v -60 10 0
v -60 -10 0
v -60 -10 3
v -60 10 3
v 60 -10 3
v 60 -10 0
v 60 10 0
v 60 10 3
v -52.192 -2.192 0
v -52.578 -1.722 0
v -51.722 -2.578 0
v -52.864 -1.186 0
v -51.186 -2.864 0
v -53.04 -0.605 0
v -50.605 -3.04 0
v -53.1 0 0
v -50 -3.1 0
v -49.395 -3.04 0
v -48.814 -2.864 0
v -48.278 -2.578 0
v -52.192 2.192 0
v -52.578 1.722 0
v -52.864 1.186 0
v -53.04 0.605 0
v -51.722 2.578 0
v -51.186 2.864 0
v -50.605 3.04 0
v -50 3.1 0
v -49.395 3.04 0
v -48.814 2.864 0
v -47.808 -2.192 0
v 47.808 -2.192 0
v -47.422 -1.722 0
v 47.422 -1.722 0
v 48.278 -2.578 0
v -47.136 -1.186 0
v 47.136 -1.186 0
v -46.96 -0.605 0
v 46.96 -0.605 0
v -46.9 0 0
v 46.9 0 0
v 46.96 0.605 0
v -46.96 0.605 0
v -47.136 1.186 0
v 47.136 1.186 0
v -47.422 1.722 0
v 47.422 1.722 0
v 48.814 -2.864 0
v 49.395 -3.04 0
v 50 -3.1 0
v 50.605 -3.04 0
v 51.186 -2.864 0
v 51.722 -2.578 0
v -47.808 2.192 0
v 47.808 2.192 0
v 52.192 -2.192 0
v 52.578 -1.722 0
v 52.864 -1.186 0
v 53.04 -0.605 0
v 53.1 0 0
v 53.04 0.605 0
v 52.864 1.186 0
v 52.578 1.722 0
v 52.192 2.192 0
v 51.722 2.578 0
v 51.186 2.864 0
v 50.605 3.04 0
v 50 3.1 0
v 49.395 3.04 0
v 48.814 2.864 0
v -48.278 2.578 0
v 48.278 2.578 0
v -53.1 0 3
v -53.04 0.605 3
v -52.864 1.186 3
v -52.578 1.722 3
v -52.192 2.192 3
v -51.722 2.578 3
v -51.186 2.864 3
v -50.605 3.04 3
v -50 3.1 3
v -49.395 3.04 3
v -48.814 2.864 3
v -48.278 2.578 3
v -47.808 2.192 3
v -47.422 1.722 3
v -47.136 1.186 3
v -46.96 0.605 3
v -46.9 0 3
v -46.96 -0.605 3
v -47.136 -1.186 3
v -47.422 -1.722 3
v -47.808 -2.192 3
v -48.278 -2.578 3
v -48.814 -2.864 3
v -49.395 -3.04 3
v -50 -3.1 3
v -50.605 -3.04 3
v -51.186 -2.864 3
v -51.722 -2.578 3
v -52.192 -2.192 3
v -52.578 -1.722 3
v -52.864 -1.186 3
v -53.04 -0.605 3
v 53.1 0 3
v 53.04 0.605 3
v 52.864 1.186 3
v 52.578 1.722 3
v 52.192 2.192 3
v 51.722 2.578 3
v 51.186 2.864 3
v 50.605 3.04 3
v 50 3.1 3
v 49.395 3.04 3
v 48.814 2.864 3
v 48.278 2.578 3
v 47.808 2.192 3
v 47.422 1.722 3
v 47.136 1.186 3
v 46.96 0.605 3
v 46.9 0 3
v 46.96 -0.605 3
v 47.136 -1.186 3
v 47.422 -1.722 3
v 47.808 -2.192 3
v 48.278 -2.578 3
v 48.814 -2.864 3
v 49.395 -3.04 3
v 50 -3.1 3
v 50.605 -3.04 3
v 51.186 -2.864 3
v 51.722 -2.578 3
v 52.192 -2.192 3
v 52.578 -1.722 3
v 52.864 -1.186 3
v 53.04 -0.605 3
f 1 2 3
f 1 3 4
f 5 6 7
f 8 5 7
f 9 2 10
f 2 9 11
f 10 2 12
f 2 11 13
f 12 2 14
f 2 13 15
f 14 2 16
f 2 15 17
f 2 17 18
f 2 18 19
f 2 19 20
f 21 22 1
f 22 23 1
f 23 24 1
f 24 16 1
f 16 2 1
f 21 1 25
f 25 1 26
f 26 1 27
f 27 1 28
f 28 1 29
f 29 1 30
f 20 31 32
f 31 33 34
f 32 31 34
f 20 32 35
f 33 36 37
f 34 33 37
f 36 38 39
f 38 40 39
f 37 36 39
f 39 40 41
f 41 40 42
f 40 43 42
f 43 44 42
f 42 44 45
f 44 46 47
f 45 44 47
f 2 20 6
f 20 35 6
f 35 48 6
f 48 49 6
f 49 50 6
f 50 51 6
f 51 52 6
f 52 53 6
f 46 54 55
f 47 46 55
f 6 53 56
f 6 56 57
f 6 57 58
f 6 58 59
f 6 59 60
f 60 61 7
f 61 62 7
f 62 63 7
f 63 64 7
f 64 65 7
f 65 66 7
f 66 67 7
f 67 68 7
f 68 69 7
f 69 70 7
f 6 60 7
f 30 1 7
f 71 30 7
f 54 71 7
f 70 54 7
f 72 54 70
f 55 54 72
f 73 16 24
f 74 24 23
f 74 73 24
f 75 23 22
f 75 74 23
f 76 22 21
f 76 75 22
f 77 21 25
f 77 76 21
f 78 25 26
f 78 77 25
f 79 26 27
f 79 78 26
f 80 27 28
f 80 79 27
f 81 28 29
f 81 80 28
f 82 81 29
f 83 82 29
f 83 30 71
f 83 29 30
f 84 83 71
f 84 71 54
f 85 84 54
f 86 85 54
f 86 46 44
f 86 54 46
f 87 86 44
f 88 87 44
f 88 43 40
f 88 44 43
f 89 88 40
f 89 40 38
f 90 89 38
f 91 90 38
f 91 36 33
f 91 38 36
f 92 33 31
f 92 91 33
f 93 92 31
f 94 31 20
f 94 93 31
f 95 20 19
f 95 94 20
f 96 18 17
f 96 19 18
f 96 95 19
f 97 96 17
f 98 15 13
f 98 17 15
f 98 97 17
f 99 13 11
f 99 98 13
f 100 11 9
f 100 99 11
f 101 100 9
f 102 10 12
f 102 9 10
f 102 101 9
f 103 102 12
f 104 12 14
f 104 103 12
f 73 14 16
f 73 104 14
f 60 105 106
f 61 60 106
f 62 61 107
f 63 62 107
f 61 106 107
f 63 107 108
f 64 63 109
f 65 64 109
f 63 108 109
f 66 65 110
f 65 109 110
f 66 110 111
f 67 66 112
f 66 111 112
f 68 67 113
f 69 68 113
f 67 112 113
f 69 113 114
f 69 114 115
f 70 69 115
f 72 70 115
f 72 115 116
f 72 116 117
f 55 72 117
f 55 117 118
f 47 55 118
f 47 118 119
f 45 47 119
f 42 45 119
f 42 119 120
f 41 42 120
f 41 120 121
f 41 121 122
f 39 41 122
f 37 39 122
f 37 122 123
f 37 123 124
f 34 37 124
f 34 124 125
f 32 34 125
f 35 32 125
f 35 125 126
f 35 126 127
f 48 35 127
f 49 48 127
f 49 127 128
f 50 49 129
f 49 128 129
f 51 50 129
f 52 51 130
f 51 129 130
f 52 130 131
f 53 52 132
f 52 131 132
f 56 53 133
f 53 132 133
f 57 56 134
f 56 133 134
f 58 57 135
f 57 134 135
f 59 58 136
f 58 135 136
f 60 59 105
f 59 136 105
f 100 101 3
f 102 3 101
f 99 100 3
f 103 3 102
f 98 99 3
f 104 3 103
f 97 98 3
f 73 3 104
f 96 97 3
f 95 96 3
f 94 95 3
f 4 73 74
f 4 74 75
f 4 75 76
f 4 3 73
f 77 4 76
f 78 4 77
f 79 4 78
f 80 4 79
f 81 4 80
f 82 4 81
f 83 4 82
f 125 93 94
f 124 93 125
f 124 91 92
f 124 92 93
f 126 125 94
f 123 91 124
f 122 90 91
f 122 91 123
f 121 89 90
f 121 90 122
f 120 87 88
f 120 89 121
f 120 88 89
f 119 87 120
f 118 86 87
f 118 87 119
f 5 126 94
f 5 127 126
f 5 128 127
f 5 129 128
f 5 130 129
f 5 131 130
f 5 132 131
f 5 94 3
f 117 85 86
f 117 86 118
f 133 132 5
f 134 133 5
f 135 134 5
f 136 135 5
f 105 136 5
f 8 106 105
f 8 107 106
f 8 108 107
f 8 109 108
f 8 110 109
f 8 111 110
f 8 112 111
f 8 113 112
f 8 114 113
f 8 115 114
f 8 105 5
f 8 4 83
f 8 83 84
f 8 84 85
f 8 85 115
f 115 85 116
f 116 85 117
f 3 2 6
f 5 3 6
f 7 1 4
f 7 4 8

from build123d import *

# Parameters (mm, degrees)
F0_W     = 120
F0_H     = 20
F1_DEPTH = 3
F2_R     = 3.1
F3_DEPTH = 25


# Not quite as in the source:
# - a pattern or mirror of a feature is missing from the dataset's text; its kind, count and spacing are read off the source's solid


with BuildPart() as f1:
    # F0 (on Top) → F1 (new body)
    with BuildSketch(Plane.XY):
        Rectangle(F0_W, F0_H)
    extrude(amount=F1_DEPTH)

    # F2 (on face) → F3 (cut)
    with BuildSketch(Plane.XY.offset(3)):
        with Locations((50, 0)):
            Circle(F2_R)
    f3 = extrude(amount=-F3_DEPTH, mode=Mode.SUBTRACT)

    # F3_copies: F3 across plane
    add(f3.mirror(Plane(origin=(0, 0, 0), x_dir=(0, 0, -1), z_dir=(-1, 0, 0))), mode=Mode.SUBTRACT)


solid = f1.part
